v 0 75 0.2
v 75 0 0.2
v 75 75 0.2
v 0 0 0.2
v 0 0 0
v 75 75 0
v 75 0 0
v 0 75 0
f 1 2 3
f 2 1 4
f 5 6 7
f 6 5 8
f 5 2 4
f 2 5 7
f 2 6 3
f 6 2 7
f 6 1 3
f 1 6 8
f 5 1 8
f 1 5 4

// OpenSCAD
Height = 0.2;
Width = 75;
Depth = 75;


cube([Width,Depth,Height]); 
